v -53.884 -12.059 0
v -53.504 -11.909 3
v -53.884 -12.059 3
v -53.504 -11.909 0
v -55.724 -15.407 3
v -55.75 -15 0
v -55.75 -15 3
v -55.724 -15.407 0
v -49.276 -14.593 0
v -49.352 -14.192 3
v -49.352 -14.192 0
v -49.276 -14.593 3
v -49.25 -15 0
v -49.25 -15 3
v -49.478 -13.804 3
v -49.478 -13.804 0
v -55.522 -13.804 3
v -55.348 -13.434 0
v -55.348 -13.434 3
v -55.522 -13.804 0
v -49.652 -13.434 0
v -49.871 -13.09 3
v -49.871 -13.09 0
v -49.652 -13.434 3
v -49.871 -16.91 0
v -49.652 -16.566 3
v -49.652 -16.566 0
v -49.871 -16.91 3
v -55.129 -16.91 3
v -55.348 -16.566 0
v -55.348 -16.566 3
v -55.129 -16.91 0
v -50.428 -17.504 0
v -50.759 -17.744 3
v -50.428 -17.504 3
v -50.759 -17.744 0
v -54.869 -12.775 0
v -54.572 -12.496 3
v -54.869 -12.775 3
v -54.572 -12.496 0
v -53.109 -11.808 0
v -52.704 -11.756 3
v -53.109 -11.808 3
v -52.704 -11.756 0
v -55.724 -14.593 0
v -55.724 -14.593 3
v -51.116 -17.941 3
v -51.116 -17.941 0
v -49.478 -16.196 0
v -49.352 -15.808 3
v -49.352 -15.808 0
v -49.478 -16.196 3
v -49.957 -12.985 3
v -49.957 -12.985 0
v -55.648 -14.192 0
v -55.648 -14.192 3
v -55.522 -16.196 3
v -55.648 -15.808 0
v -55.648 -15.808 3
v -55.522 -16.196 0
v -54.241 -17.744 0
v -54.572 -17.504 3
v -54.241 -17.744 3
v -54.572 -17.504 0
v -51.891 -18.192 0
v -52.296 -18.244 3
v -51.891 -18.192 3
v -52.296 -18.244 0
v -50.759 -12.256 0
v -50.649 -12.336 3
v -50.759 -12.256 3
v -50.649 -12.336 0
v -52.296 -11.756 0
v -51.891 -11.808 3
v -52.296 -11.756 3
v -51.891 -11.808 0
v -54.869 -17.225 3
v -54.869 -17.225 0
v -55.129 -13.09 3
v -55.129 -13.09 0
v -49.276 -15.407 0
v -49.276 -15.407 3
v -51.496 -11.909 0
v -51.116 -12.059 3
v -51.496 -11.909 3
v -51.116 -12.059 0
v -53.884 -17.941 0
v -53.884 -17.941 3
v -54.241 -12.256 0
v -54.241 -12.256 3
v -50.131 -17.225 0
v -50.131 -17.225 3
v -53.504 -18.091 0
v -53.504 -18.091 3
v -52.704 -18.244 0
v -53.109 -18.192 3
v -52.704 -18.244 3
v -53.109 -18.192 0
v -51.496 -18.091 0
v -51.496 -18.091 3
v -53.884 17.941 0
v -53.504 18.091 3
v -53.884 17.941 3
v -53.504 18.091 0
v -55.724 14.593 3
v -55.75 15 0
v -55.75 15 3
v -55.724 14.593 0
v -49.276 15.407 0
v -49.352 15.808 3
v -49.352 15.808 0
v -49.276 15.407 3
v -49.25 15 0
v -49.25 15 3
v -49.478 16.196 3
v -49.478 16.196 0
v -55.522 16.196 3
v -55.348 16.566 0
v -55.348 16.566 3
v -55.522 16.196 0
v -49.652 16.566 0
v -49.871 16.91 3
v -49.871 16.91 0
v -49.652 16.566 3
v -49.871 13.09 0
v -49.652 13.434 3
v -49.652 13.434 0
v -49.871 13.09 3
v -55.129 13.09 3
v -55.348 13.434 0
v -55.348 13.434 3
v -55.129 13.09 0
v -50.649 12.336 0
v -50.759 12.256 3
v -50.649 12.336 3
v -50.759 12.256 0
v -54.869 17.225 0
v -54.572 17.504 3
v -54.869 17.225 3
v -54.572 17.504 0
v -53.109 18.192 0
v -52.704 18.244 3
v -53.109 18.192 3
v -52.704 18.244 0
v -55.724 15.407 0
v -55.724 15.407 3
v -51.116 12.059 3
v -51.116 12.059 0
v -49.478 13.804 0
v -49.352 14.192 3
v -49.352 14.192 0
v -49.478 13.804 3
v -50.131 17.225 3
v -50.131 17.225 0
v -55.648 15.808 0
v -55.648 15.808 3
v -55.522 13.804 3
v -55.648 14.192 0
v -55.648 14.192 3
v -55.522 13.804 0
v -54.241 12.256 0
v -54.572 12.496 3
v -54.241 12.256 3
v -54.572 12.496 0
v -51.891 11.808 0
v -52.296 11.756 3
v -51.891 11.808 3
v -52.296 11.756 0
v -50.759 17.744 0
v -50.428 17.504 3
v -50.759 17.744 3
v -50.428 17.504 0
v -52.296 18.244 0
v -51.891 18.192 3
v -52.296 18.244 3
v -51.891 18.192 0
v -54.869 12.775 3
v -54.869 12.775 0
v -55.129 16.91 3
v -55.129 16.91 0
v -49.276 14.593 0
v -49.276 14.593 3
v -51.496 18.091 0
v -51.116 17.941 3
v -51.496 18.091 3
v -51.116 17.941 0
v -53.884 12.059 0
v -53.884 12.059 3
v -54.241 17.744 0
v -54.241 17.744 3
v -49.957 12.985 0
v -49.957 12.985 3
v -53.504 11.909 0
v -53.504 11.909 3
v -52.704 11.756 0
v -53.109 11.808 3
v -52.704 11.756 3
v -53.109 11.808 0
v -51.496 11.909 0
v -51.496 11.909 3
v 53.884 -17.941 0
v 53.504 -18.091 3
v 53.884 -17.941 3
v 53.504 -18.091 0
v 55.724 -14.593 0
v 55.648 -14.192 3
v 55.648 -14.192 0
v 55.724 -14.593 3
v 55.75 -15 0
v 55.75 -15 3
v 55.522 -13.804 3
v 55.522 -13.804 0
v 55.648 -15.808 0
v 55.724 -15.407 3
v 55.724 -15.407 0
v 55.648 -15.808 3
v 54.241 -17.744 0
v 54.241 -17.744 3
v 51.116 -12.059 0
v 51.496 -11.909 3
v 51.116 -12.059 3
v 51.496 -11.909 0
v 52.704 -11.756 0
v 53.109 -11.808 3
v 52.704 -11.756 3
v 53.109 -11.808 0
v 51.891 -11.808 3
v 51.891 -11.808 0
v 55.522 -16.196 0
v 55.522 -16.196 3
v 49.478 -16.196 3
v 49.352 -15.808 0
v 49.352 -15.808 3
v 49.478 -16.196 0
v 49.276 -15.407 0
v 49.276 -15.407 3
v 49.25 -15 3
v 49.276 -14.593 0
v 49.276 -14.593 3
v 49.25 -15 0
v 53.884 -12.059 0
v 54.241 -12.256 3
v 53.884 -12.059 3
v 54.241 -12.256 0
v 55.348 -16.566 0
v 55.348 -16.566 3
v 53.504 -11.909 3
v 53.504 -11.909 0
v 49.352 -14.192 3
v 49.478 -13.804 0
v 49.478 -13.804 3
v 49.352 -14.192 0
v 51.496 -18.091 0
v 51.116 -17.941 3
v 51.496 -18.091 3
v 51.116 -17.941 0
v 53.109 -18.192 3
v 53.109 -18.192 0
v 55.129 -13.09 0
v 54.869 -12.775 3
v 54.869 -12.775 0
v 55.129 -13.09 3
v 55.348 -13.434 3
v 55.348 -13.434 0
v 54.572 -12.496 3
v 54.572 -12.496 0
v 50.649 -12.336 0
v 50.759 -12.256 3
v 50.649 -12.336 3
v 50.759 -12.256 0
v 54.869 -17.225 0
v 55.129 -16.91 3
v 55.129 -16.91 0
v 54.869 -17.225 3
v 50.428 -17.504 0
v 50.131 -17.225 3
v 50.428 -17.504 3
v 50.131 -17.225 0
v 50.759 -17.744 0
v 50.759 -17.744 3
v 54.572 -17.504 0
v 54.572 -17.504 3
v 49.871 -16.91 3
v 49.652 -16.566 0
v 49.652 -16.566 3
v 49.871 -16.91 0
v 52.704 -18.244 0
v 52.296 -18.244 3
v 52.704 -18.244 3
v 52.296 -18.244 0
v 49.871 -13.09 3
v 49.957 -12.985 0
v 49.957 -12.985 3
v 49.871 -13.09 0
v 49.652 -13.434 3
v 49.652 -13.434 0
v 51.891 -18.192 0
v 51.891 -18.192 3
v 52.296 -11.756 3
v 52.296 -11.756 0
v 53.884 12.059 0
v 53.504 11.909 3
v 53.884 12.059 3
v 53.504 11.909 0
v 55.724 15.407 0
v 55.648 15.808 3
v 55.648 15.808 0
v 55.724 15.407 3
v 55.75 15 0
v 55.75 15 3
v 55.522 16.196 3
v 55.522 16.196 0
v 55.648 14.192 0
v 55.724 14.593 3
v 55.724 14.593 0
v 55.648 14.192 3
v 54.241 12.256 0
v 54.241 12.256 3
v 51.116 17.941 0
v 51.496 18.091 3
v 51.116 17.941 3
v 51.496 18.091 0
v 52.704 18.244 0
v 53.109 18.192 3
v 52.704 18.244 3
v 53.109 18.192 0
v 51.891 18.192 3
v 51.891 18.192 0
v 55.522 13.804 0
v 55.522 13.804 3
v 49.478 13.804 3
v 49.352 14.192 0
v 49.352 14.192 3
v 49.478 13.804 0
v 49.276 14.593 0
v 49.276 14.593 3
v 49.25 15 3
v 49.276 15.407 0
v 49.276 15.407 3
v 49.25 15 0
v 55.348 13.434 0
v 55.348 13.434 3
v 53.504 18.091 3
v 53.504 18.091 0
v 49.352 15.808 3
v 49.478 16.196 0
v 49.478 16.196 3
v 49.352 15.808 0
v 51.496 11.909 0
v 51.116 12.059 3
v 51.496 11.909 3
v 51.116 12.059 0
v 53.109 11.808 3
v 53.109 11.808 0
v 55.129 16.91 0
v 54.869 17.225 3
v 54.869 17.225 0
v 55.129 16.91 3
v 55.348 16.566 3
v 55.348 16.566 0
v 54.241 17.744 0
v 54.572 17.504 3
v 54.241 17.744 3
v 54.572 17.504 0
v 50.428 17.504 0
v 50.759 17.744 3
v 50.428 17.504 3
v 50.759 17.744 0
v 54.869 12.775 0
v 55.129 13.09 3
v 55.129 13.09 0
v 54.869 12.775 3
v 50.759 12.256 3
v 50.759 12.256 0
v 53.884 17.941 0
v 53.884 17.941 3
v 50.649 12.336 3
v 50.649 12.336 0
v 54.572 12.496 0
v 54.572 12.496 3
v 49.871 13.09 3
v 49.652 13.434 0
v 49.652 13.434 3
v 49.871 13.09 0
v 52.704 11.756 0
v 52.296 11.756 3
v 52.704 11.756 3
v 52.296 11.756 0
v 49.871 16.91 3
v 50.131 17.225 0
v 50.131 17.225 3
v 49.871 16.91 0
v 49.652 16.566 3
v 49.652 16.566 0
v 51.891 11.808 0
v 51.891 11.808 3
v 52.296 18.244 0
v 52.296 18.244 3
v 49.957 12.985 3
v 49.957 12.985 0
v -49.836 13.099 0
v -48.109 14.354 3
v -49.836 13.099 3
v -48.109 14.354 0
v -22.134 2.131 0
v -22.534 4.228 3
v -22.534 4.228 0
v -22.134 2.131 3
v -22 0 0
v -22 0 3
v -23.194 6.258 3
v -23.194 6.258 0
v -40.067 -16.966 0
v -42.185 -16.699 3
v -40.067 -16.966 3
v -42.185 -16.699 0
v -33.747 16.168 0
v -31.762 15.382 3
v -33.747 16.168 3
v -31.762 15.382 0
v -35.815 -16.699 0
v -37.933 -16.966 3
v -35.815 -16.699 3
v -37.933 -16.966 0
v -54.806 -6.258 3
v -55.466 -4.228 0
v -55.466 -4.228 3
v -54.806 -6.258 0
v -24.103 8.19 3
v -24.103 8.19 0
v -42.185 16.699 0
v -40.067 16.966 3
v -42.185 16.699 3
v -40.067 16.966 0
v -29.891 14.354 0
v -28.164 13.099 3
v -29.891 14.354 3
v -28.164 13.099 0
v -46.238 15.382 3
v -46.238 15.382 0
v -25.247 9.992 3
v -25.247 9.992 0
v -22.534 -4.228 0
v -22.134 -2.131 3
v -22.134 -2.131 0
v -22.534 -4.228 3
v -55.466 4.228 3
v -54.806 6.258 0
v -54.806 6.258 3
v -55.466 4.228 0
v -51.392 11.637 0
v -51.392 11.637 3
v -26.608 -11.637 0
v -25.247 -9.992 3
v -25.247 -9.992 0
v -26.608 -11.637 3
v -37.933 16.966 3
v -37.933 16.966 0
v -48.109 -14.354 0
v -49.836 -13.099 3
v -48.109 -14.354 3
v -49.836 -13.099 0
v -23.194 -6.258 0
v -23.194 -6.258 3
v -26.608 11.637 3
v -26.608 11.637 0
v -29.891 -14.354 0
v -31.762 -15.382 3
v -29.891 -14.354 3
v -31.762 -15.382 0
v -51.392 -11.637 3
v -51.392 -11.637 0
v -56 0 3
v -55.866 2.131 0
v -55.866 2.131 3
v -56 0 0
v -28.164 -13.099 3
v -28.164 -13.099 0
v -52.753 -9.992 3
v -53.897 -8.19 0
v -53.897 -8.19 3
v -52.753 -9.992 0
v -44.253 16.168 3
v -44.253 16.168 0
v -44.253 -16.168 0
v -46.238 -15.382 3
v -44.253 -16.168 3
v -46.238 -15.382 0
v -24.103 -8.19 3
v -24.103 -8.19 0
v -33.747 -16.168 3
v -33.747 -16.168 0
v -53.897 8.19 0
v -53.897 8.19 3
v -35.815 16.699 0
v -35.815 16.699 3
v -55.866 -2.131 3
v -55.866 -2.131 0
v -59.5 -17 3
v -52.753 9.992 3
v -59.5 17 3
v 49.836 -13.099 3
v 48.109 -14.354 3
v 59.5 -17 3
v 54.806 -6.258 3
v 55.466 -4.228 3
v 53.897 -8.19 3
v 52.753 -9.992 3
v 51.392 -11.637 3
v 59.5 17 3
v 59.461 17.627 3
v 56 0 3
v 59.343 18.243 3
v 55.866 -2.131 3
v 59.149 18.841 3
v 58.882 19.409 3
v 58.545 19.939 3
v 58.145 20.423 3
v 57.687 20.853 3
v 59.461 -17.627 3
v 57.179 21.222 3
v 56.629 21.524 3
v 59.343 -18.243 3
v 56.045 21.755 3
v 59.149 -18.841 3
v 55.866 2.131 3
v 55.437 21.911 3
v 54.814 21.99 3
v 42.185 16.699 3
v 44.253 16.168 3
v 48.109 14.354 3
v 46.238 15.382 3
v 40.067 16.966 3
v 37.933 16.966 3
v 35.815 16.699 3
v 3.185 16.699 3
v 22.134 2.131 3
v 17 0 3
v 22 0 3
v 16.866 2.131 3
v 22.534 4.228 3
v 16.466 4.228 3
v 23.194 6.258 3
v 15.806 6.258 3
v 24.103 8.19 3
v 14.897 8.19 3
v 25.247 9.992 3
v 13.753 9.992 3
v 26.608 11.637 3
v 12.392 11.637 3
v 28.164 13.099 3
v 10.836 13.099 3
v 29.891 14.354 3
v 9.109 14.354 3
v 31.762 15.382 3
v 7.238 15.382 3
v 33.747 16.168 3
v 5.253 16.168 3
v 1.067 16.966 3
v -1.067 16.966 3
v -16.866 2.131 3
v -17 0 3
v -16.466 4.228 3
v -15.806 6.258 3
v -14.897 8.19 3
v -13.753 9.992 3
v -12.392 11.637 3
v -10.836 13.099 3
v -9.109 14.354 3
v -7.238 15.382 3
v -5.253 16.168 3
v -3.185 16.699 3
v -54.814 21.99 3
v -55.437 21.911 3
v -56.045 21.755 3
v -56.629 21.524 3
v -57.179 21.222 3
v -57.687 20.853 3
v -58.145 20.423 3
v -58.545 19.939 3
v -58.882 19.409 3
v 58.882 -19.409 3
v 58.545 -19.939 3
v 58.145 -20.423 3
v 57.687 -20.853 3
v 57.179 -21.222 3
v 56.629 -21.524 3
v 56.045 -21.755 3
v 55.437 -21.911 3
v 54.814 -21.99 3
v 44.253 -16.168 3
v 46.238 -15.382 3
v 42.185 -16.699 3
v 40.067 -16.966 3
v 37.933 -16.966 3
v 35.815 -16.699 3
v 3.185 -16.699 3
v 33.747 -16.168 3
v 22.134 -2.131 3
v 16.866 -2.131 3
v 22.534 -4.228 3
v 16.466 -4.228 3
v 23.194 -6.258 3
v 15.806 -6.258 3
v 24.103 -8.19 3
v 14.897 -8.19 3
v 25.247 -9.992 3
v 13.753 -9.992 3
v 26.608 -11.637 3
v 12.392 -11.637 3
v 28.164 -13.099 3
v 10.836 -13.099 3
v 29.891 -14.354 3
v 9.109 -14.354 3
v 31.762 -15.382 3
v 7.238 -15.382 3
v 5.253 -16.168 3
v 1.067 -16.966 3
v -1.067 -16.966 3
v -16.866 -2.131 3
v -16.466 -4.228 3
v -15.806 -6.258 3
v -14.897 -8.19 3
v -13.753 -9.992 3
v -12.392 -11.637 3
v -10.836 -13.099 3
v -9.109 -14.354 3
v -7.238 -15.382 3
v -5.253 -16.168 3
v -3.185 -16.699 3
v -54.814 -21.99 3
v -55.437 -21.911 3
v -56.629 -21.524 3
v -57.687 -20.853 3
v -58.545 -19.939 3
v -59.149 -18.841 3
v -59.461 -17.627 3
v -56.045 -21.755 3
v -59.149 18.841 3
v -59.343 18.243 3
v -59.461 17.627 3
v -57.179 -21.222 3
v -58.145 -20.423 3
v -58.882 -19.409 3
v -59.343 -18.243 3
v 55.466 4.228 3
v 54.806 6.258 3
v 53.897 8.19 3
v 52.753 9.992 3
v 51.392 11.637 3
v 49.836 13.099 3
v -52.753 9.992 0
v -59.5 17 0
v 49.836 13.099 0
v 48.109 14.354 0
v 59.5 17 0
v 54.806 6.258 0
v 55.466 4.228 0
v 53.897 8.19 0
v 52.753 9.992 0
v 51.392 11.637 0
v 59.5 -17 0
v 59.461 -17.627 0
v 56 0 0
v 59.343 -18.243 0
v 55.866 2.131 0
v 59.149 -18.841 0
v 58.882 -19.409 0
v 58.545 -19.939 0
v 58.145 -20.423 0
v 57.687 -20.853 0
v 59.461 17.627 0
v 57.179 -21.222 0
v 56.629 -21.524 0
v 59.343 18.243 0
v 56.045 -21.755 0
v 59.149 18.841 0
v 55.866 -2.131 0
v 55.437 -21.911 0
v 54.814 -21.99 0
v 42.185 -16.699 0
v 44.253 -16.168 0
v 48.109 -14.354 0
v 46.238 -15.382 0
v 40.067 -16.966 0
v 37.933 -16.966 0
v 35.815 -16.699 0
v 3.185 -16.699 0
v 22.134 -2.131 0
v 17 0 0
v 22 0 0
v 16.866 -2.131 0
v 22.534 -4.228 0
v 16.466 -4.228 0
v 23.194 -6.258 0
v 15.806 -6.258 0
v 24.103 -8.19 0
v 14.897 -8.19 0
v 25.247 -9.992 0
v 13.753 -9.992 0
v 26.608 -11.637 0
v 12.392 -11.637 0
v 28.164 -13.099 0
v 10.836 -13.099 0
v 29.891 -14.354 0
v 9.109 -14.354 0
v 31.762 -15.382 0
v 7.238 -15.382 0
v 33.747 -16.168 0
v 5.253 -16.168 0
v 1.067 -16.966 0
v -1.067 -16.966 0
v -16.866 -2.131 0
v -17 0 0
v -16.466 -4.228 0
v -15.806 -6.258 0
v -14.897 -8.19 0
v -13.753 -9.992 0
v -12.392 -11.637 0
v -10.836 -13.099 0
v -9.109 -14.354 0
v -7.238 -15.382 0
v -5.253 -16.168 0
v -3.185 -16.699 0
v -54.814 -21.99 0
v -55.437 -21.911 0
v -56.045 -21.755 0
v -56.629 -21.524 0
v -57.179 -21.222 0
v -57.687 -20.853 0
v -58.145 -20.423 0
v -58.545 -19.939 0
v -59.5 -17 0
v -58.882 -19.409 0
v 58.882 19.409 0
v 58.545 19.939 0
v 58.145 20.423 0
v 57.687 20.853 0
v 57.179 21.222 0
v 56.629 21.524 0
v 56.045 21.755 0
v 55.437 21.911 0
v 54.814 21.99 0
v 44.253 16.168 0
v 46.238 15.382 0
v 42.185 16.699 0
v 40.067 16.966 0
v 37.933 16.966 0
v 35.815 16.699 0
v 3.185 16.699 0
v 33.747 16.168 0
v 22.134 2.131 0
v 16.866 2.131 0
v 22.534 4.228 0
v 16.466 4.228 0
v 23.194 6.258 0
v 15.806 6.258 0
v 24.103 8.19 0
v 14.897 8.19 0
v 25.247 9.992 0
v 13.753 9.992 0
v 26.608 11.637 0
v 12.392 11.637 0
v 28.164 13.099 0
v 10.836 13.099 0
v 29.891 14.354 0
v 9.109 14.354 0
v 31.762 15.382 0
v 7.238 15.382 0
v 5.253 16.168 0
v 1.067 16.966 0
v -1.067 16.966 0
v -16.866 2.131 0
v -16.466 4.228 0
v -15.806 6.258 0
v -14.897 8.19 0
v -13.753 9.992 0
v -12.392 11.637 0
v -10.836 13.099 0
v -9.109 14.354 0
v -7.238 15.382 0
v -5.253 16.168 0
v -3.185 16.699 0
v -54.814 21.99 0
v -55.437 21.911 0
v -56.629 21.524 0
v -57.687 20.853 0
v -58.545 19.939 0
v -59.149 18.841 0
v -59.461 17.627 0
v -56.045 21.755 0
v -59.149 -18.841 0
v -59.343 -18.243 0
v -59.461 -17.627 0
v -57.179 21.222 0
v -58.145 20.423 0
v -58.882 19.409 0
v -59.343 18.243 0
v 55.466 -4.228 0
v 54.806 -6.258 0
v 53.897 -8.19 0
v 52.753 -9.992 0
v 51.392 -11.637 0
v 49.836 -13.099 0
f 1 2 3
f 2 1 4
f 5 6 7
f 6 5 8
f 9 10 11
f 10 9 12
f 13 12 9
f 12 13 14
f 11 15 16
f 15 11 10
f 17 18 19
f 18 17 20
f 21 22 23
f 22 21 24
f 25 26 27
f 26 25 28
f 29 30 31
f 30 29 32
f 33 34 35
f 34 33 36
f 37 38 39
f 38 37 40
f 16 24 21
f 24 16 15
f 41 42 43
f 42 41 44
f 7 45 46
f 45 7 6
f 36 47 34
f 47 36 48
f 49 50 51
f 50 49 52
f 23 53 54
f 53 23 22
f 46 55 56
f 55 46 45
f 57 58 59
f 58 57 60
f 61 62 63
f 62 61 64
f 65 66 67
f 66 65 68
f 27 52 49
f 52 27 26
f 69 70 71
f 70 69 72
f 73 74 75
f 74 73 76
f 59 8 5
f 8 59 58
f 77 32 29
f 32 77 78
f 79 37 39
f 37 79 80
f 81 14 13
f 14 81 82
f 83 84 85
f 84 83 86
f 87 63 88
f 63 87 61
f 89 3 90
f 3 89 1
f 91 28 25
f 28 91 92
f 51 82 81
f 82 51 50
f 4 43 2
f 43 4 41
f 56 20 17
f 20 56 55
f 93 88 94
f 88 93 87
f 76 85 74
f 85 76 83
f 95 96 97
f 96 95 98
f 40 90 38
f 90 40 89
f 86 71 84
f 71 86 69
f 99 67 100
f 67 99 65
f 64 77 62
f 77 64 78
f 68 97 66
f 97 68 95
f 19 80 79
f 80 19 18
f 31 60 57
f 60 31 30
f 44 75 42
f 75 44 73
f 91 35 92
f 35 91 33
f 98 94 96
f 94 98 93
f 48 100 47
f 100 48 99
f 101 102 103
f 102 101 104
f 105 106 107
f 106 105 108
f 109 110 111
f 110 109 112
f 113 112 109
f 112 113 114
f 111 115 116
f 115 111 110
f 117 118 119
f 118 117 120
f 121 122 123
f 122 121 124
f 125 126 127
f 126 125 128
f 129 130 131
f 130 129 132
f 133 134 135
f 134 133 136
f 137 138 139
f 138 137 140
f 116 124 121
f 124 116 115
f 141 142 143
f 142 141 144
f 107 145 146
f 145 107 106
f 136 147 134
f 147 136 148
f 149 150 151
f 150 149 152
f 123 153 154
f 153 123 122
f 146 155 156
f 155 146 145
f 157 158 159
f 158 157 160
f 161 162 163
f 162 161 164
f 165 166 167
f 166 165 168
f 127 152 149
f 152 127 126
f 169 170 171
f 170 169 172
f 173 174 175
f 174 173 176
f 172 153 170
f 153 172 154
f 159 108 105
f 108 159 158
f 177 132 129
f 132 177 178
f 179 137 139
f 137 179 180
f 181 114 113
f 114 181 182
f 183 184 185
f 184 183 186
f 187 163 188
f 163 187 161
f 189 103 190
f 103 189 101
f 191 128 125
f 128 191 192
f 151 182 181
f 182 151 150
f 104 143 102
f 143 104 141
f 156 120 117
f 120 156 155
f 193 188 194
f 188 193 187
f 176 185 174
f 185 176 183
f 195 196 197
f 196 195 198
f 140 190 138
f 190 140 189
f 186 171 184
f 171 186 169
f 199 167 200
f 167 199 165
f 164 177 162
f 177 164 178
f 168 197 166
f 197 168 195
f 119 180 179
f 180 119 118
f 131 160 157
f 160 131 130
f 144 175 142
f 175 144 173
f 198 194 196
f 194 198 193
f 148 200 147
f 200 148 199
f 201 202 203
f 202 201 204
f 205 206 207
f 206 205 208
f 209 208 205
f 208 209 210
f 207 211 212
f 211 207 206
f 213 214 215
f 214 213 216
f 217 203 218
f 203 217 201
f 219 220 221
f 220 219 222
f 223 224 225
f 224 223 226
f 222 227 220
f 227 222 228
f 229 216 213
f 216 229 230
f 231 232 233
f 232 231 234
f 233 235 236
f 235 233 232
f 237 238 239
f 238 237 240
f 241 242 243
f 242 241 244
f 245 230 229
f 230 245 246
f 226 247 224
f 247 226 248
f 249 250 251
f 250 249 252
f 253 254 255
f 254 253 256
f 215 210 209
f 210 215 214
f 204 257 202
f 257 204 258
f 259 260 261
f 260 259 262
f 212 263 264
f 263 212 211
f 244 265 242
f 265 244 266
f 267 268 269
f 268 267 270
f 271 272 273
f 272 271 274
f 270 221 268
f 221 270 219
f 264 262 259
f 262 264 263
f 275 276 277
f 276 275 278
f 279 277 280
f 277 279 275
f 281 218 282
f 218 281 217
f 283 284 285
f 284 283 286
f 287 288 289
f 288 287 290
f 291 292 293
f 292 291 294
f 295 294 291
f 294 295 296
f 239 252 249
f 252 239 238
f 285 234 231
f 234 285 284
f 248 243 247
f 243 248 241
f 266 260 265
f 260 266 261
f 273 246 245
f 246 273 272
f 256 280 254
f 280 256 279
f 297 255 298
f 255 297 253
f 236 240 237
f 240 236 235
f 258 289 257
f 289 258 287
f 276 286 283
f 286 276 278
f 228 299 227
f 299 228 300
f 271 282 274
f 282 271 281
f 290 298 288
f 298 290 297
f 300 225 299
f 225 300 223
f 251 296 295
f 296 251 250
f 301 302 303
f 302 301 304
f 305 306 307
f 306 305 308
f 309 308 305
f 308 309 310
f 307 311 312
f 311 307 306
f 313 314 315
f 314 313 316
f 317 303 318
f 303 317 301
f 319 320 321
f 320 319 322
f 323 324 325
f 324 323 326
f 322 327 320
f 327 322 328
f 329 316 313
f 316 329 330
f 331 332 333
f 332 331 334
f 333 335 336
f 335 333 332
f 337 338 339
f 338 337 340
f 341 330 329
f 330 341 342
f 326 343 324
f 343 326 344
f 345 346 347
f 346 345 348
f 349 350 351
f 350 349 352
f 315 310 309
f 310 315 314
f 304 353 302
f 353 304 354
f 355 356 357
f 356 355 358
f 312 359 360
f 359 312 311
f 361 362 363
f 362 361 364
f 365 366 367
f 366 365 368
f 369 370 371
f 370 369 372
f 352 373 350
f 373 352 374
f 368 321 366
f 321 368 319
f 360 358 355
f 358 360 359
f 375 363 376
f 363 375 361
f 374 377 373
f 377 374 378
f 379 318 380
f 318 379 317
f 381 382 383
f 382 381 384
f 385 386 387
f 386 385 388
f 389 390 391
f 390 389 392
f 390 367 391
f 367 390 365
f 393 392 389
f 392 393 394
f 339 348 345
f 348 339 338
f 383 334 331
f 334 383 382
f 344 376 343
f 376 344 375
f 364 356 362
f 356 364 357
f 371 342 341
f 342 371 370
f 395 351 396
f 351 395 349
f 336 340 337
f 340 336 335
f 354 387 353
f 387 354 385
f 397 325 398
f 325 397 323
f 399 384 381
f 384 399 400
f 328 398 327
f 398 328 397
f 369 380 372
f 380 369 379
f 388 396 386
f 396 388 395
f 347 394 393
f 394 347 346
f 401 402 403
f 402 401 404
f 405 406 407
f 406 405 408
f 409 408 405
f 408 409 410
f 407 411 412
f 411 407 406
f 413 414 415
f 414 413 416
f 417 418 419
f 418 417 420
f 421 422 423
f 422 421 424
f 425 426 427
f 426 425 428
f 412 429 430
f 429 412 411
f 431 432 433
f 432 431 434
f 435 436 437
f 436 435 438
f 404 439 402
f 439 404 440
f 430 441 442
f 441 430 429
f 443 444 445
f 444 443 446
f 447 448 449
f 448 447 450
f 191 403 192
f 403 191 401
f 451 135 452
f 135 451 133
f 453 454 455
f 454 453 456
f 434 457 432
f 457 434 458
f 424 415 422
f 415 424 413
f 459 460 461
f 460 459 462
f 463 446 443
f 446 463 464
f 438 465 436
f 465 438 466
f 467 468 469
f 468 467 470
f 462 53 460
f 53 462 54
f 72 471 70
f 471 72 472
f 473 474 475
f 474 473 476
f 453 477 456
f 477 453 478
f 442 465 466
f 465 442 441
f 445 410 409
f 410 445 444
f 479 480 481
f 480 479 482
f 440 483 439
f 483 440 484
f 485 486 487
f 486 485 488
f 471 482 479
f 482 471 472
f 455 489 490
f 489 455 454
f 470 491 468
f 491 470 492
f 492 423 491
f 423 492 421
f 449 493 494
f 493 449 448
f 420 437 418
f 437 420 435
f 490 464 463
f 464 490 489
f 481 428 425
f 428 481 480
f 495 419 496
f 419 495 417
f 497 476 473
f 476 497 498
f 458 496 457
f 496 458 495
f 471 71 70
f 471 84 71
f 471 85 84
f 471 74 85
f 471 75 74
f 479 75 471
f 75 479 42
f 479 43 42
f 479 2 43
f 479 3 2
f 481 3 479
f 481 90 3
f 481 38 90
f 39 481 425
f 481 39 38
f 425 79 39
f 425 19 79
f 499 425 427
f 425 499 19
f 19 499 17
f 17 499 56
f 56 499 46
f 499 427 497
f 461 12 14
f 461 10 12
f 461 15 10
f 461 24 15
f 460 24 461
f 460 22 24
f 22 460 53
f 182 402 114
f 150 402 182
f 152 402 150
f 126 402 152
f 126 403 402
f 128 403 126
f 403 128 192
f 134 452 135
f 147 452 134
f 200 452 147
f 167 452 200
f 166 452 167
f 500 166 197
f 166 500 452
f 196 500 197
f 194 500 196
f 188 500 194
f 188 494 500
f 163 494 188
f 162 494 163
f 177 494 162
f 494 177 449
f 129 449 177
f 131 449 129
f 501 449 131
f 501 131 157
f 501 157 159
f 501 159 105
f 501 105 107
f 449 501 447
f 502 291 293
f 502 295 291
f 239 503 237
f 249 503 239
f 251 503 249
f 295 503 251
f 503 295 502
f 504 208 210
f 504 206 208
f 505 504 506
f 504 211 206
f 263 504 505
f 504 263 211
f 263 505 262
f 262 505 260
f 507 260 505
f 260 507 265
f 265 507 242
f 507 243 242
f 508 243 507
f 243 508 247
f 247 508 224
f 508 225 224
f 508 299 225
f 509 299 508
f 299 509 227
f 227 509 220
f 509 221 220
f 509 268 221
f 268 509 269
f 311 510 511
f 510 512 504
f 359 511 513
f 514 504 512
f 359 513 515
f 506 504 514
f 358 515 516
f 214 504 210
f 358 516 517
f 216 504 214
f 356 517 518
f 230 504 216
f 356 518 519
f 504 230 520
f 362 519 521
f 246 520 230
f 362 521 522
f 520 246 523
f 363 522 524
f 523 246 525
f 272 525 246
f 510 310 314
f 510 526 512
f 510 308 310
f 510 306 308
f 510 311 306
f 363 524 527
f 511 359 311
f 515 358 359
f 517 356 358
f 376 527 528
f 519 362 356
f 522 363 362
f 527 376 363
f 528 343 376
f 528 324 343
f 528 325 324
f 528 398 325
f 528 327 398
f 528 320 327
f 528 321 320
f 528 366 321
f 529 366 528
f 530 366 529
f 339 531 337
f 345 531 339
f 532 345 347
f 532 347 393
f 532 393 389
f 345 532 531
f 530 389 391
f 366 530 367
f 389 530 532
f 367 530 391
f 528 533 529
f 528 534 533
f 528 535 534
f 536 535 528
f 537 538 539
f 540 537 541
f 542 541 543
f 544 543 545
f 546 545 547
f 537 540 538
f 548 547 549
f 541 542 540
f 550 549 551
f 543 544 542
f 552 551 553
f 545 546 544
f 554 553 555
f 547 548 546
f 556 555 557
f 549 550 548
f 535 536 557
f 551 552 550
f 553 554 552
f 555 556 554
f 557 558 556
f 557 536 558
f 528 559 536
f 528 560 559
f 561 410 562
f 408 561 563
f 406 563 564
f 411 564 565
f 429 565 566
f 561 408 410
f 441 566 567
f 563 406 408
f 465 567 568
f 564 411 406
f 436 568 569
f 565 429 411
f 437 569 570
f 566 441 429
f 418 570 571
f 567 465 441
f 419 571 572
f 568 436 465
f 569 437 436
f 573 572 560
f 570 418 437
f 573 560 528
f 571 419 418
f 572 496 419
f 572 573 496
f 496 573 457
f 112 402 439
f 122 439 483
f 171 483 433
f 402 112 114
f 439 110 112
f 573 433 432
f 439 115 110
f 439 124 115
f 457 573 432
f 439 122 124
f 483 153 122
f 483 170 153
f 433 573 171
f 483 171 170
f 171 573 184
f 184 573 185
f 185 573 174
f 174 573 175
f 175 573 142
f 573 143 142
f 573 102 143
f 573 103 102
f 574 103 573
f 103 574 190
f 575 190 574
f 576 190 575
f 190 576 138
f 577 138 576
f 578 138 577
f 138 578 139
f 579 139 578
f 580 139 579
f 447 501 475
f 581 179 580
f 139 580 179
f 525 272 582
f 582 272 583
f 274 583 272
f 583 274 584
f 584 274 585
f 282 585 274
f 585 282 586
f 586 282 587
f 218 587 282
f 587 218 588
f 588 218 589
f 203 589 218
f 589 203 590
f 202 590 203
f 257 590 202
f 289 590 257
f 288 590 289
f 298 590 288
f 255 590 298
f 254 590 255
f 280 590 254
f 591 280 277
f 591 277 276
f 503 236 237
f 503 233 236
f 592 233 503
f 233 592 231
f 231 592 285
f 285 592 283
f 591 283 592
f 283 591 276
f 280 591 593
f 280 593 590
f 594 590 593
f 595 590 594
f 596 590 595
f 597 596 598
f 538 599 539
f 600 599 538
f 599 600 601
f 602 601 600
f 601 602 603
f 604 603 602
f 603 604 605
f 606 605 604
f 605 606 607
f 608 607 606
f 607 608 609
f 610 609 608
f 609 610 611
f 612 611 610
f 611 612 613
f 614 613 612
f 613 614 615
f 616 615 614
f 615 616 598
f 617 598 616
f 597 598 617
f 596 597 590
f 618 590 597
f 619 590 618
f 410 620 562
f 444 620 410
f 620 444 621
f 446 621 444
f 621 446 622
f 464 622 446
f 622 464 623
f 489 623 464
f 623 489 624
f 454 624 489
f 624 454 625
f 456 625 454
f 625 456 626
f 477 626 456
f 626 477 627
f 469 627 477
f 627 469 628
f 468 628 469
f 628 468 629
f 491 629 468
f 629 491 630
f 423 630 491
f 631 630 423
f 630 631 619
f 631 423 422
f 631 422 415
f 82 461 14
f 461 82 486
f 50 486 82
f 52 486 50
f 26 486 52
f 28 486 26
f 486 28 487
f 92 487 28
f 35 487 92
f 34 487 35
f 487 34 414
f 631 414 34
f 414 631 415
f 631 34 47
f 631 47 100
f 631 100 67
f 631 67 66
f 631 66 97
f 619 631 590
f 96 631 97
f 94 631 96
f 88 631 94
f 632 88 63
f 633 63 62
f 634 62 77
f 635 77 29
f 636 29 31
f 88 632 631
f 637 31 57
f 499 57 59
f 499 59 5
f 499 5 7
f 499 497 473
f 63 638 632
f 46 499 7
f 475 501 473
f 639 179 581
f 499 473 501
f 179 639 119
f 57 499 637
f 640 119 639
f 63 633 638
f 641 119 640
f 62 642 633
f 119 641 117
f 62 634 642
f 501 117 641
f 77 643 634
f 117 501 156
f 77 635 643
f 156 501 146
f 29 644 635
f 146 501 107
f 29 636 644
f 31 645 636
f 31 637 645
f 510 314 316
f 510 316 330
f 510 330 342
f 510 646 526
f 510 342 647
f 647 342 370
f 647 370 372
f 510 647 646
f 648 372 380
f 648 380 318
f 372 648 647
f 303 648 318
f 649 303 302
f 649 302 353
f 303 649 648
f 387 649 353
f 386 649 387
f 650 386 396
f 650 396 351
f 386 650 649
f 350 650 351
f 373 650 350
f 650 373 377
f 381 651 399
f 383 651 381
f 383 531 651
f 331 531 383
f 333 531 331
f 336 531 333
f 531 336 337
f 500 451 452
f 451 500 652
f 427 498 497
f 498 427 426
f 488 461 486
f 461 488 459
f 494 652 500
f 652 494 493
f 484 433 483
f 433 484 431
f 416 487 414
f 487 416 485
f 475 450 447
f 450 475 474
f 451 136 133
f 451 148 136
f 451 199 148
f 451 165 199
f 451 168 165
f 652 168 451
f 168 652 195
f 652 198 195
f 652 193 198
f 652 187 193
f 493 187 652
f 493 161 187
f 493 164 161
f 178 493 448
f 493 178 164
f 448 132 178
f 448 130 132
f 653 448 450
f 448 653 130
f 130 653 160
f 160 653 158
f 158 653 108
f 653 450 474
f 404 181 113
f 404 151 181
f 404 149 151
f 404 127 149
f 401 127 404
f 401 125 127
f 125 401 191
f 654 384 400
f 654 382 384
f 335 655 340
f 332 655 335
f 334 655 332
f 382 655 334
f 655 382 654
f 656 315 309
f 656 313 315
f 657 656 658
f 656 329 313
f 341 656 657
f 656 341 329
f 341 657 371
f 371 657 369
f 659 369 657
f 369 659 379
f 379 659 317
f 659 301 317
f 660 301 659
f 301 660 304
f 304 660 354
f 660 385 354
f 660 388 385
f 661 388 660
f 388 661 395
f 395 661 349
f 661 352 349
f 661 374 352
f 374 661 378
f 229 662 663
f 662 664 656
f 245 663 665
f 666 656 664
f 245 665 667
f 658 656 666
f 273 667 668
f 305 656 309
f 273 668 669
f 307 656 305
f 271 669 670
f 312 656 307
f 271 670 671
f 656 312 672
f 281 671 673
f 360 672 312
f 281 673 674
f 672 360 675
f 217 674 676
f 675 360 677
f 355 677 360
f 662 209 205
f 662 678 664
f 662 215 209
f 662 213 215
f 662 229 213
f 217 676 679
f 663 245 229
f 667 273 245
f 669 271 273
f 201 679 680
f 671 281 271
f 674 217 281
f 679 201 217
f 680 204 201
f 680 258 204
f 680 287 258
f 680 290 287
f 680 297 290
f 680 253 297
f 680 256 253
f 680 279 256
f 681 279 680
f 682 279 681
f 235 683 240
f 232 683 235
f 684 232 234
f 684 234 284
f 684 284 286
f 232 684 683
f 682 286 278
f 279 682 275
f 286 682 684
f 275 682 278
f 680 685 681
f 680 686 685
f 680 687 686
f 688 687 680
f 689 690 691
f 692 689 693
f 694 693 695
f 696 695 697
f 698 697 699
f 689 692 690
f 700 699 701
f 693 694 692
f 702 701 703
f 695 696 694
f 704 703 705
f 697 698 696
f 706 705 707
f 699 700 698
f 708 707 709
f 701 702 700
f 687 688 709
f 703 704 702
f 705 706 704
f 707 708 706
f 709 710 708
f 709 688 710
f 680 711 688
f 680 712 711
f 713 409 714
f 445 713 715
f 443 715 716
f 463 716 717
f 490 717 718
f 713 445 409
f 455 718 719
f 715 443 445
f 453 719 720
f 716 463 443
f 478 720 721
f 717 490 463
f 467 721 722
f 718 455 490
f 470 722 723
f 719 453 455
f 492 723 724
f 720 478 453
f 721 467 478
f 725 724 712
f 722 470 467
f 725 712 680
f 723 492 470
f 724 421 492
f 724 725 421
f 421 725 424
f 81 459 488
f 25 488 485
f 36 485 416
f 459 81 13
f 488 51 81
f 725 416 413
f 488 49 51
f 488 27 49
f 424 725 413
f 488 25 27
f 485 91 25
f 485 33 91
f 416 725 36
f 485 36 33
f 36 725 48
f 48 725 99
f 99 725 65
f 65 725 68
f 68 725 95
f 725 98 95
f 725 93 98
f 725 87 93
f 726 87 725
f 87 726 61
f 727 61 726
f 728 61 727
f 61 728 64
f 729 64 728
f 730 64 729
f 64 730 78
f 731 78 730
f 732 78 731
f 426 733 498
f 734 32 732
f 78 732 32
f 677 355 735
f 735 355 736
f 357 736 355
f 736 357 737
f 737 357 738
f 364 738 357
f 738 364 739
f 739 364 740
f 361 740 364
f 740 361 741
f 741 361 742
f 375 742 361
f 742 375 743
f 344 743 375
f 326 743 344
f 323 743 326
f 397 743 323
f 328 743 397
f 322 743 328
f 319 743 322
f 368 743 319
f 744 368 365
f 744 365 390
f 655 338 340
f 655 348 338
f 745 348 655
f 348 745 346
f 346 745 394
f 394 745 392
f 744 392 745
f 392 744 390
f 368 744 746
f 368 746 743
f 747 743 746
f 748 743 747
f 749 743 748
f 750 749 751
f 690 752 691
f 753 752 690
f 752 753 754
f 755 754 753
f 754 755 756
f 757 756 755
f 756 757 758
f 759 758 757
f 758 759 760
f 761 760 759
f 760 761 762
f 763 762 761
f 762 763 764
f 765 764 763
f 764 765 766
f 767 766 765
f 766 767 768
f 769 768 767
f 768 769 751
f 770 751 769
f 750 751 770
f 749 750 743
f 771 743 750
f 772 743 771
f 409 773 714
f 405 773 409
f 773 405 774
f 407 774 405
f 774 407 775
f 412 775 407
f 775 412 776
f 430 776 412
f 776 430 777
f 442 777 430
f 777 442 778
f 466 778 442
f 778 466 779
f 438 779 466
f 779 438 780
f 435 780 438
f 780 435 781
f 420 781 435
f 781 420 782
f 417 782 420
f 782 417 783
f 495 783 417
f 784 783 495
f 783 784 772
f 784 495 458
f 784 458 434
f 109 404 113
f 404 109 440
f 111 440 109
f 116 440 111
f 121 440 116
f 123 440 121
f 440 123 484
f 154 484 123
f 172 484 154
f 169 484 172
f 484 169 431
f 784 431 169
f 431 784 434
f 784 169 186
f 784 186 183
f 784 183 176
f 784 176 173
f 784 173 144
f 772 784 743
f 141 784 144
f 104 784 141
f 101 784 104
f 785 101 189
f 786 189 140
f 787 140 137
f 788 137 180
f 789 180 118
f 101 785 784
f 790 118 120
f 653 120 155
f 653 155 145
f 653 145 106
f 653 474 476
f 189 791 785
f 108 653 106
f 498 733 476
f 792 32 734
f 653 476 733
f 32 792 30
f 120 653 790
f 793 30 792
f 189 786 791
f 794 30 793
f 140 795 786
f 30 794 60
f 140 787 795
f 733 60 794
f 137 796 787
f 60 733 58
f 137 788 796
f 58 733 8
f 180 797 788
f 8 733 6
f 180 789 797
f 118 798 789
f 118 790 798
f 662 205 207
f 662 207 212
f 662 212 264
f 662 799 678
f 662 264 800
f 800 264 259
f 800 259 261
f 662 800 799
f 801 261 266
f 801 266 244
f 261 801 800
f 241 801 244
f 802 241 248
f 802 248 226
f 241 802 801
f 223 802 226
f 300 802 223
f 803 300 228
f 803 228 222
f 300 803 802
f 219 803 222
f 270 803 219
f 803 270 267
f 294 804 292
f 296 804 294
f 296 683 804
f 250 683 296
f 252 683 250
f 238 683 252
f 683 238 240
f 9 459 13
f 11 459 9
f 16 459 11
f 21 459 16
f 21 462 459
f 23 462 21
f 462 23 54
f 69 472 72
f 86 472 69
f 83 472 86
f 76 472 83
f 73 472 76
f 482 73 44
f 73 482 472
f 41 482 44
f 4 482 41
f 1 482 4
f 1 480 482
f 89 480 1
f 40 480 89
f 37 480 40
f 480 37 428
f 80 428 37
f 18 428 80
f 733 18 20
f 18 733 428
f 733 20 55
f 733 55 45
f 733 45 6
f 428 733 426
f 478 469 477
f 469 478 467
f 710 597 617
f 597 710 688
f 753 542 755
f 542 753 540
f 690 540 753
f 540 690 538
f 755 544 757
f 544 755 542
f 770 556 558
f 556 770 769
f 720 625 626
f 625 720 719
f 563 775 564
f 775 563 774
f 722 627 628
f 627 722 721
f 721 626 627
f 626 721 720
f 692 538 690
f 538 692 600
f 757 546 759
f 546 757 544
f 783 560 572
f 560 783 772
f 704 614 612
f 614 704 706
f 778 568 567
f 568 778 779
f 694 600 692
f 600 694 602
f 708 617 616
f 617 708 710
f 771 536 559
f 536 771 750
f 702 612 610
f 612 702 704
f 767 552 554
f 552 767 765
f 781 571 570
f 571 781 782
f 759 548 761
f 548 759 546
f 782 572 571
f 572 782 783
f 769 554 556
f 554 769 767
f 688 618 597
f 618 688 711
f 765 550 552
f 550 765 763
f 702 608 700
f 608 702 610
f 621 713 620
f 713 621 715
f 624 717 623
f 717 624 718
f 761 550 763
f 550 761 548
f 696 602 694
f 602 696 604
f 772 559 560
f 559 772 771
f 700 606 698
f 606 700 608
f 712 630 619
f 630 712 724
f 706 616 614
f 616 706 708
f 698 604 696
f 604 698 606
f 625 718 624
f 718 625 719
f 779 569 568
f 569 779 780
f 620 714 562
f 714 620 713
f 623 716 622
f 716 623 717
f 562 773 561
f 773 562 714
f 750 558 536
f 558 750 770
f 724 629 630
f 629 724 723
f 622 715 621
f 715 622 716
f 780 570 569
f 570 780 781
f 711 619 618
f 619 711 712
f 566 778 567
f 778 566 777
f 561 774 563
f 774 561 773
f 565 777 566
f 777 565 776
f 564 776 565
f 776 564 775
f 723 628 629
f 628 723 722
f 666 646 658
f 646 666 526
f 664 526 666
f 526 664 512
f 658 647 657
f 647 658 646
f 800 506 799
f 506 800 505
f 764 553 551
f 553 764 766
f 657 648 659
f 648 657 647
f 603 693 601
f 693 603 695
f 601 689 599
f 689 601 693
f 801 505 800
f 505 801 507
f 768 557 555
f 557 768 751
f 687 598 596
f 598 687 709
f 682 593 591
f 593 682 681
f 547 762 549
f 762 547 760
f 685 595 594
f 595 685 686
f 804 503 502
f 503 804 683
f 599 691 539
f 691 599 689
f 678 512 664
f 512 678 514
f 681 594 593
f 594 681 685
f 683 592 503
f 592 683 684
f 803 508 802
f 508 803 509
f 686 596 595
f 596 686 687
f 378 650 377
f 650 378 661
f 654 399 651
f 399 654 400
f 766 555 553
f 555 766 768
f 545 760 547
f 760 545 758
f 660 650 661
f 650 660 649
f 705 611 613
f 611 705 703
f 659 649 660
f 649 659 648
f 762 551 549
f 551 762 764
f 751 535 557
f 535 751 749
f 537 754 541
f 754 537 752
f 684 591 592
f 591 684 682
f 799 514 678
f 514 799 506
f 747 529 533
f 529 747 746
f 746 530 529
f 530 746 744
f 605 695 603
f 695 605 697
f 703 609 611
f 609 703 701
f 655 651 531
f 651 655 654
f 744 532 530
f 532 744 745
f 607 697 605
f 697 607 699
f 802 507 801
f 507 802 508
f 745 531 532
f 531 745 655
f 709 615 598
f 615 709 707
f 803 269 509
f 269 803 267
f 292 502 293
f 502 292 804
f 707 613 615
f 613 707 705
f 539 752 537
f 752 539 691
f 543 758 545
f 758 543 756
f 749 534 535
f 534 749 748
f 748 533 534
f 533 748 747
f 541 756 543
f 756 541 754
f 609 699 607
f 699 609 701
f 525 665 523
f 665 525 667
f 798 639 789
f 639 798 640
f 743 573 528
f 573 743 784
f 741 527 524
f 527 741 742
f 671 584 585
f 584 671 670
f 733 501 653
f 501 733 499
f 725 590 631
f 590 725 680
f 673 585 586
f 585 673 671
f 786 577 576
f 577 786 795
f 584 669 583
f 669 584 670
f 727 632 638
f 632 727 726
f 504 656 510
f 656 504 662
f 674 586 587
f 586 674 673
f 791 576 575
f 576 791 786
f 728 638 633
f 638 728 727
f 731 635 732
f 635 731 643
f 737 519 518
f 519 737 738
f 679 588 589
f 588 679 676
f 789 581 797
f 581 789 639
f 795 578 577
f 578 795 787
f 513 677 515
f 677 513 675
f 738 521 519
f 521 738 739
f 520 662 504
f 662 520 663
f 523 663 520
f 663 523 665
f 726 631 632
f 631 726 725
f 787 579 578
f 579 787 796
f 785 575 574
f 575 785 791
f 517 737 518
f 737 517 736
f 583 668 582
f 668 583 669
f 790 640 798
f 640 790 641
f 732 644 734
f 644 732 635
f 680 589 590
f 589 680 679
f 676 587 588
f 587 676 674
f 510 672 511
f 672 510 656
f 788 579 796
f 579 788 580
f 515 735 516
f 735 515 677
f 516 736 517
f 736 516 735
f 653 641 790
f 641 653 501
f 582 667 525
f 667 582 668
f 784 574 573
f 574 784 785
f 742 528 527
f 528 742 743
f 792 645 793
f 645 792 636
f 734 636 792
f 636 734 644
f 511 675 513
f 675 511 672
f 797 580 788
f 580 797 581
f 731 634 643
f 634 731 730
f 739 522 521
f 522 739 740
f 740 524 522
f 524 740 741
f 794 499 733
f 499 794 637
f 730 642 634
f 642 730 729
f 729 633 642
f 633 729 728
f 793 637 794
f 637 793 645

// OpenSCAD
$fn = 50;

difference() {
	union() {
		hull() {
			translate(v = [-54.5, 17.0, 0]) {
				cylinder(h = 3, r = 5);
			}
			translate(v = [54.5, 17.0, 0]) {
				cylinder(h = 3, r = 5);
			}
			translate(v = [-54.5, -17.0, 0]) {
				cylinder(h = 3, r = 5);
			}
			translate(v = [54.5, -17.0, 0]) {
				cylinder(h = 3, r = 5);
			}
		}
	}
	union() {
		translate(v = [-52.5, -15.0, -100.0]) {
			cylinder(h = 200, r = 3.25);
		}
		translate(v = [-52.5, 15.0, -100.0]) {
			cylinder(h = 200, r = 3.25);
		}
		translate(v = [52.5, -15.0, -100.0]) {
			cylinder(h = 200, r = 3.25);
		}
		translate(v = [52.5, 15.0, -100.0]) {
			cylinder(h = 200, r = 3.25);
		}
		translate(v = [-52.5, -15.0, -100.0]) {
			cylinder(h = 200, r = 1.8);
		}
		translate(v = [-52.5, 15.0, -100.0]) {
			cylinder(h = 200, r = 1.8);
		}
		translate(v = [52.5, -15.0, -100.0]) {
			cylinder(h = 200, r = 1.8);
		}
		translate(v = [52.5, 15.0, -100.0]) {
			cylinder(h = 200, r = 1.8);
		}
		translate(v = [-39.0, 0, 0.0]) {
			cylinder(h = 3, r = 17.0);
		}
		cylinder(h = 3, r = 17.0);
		translate(v = [39.0, 0, 0.0]) {
			cylinder(h = 3, r = 17.0);
		}
	}
}
